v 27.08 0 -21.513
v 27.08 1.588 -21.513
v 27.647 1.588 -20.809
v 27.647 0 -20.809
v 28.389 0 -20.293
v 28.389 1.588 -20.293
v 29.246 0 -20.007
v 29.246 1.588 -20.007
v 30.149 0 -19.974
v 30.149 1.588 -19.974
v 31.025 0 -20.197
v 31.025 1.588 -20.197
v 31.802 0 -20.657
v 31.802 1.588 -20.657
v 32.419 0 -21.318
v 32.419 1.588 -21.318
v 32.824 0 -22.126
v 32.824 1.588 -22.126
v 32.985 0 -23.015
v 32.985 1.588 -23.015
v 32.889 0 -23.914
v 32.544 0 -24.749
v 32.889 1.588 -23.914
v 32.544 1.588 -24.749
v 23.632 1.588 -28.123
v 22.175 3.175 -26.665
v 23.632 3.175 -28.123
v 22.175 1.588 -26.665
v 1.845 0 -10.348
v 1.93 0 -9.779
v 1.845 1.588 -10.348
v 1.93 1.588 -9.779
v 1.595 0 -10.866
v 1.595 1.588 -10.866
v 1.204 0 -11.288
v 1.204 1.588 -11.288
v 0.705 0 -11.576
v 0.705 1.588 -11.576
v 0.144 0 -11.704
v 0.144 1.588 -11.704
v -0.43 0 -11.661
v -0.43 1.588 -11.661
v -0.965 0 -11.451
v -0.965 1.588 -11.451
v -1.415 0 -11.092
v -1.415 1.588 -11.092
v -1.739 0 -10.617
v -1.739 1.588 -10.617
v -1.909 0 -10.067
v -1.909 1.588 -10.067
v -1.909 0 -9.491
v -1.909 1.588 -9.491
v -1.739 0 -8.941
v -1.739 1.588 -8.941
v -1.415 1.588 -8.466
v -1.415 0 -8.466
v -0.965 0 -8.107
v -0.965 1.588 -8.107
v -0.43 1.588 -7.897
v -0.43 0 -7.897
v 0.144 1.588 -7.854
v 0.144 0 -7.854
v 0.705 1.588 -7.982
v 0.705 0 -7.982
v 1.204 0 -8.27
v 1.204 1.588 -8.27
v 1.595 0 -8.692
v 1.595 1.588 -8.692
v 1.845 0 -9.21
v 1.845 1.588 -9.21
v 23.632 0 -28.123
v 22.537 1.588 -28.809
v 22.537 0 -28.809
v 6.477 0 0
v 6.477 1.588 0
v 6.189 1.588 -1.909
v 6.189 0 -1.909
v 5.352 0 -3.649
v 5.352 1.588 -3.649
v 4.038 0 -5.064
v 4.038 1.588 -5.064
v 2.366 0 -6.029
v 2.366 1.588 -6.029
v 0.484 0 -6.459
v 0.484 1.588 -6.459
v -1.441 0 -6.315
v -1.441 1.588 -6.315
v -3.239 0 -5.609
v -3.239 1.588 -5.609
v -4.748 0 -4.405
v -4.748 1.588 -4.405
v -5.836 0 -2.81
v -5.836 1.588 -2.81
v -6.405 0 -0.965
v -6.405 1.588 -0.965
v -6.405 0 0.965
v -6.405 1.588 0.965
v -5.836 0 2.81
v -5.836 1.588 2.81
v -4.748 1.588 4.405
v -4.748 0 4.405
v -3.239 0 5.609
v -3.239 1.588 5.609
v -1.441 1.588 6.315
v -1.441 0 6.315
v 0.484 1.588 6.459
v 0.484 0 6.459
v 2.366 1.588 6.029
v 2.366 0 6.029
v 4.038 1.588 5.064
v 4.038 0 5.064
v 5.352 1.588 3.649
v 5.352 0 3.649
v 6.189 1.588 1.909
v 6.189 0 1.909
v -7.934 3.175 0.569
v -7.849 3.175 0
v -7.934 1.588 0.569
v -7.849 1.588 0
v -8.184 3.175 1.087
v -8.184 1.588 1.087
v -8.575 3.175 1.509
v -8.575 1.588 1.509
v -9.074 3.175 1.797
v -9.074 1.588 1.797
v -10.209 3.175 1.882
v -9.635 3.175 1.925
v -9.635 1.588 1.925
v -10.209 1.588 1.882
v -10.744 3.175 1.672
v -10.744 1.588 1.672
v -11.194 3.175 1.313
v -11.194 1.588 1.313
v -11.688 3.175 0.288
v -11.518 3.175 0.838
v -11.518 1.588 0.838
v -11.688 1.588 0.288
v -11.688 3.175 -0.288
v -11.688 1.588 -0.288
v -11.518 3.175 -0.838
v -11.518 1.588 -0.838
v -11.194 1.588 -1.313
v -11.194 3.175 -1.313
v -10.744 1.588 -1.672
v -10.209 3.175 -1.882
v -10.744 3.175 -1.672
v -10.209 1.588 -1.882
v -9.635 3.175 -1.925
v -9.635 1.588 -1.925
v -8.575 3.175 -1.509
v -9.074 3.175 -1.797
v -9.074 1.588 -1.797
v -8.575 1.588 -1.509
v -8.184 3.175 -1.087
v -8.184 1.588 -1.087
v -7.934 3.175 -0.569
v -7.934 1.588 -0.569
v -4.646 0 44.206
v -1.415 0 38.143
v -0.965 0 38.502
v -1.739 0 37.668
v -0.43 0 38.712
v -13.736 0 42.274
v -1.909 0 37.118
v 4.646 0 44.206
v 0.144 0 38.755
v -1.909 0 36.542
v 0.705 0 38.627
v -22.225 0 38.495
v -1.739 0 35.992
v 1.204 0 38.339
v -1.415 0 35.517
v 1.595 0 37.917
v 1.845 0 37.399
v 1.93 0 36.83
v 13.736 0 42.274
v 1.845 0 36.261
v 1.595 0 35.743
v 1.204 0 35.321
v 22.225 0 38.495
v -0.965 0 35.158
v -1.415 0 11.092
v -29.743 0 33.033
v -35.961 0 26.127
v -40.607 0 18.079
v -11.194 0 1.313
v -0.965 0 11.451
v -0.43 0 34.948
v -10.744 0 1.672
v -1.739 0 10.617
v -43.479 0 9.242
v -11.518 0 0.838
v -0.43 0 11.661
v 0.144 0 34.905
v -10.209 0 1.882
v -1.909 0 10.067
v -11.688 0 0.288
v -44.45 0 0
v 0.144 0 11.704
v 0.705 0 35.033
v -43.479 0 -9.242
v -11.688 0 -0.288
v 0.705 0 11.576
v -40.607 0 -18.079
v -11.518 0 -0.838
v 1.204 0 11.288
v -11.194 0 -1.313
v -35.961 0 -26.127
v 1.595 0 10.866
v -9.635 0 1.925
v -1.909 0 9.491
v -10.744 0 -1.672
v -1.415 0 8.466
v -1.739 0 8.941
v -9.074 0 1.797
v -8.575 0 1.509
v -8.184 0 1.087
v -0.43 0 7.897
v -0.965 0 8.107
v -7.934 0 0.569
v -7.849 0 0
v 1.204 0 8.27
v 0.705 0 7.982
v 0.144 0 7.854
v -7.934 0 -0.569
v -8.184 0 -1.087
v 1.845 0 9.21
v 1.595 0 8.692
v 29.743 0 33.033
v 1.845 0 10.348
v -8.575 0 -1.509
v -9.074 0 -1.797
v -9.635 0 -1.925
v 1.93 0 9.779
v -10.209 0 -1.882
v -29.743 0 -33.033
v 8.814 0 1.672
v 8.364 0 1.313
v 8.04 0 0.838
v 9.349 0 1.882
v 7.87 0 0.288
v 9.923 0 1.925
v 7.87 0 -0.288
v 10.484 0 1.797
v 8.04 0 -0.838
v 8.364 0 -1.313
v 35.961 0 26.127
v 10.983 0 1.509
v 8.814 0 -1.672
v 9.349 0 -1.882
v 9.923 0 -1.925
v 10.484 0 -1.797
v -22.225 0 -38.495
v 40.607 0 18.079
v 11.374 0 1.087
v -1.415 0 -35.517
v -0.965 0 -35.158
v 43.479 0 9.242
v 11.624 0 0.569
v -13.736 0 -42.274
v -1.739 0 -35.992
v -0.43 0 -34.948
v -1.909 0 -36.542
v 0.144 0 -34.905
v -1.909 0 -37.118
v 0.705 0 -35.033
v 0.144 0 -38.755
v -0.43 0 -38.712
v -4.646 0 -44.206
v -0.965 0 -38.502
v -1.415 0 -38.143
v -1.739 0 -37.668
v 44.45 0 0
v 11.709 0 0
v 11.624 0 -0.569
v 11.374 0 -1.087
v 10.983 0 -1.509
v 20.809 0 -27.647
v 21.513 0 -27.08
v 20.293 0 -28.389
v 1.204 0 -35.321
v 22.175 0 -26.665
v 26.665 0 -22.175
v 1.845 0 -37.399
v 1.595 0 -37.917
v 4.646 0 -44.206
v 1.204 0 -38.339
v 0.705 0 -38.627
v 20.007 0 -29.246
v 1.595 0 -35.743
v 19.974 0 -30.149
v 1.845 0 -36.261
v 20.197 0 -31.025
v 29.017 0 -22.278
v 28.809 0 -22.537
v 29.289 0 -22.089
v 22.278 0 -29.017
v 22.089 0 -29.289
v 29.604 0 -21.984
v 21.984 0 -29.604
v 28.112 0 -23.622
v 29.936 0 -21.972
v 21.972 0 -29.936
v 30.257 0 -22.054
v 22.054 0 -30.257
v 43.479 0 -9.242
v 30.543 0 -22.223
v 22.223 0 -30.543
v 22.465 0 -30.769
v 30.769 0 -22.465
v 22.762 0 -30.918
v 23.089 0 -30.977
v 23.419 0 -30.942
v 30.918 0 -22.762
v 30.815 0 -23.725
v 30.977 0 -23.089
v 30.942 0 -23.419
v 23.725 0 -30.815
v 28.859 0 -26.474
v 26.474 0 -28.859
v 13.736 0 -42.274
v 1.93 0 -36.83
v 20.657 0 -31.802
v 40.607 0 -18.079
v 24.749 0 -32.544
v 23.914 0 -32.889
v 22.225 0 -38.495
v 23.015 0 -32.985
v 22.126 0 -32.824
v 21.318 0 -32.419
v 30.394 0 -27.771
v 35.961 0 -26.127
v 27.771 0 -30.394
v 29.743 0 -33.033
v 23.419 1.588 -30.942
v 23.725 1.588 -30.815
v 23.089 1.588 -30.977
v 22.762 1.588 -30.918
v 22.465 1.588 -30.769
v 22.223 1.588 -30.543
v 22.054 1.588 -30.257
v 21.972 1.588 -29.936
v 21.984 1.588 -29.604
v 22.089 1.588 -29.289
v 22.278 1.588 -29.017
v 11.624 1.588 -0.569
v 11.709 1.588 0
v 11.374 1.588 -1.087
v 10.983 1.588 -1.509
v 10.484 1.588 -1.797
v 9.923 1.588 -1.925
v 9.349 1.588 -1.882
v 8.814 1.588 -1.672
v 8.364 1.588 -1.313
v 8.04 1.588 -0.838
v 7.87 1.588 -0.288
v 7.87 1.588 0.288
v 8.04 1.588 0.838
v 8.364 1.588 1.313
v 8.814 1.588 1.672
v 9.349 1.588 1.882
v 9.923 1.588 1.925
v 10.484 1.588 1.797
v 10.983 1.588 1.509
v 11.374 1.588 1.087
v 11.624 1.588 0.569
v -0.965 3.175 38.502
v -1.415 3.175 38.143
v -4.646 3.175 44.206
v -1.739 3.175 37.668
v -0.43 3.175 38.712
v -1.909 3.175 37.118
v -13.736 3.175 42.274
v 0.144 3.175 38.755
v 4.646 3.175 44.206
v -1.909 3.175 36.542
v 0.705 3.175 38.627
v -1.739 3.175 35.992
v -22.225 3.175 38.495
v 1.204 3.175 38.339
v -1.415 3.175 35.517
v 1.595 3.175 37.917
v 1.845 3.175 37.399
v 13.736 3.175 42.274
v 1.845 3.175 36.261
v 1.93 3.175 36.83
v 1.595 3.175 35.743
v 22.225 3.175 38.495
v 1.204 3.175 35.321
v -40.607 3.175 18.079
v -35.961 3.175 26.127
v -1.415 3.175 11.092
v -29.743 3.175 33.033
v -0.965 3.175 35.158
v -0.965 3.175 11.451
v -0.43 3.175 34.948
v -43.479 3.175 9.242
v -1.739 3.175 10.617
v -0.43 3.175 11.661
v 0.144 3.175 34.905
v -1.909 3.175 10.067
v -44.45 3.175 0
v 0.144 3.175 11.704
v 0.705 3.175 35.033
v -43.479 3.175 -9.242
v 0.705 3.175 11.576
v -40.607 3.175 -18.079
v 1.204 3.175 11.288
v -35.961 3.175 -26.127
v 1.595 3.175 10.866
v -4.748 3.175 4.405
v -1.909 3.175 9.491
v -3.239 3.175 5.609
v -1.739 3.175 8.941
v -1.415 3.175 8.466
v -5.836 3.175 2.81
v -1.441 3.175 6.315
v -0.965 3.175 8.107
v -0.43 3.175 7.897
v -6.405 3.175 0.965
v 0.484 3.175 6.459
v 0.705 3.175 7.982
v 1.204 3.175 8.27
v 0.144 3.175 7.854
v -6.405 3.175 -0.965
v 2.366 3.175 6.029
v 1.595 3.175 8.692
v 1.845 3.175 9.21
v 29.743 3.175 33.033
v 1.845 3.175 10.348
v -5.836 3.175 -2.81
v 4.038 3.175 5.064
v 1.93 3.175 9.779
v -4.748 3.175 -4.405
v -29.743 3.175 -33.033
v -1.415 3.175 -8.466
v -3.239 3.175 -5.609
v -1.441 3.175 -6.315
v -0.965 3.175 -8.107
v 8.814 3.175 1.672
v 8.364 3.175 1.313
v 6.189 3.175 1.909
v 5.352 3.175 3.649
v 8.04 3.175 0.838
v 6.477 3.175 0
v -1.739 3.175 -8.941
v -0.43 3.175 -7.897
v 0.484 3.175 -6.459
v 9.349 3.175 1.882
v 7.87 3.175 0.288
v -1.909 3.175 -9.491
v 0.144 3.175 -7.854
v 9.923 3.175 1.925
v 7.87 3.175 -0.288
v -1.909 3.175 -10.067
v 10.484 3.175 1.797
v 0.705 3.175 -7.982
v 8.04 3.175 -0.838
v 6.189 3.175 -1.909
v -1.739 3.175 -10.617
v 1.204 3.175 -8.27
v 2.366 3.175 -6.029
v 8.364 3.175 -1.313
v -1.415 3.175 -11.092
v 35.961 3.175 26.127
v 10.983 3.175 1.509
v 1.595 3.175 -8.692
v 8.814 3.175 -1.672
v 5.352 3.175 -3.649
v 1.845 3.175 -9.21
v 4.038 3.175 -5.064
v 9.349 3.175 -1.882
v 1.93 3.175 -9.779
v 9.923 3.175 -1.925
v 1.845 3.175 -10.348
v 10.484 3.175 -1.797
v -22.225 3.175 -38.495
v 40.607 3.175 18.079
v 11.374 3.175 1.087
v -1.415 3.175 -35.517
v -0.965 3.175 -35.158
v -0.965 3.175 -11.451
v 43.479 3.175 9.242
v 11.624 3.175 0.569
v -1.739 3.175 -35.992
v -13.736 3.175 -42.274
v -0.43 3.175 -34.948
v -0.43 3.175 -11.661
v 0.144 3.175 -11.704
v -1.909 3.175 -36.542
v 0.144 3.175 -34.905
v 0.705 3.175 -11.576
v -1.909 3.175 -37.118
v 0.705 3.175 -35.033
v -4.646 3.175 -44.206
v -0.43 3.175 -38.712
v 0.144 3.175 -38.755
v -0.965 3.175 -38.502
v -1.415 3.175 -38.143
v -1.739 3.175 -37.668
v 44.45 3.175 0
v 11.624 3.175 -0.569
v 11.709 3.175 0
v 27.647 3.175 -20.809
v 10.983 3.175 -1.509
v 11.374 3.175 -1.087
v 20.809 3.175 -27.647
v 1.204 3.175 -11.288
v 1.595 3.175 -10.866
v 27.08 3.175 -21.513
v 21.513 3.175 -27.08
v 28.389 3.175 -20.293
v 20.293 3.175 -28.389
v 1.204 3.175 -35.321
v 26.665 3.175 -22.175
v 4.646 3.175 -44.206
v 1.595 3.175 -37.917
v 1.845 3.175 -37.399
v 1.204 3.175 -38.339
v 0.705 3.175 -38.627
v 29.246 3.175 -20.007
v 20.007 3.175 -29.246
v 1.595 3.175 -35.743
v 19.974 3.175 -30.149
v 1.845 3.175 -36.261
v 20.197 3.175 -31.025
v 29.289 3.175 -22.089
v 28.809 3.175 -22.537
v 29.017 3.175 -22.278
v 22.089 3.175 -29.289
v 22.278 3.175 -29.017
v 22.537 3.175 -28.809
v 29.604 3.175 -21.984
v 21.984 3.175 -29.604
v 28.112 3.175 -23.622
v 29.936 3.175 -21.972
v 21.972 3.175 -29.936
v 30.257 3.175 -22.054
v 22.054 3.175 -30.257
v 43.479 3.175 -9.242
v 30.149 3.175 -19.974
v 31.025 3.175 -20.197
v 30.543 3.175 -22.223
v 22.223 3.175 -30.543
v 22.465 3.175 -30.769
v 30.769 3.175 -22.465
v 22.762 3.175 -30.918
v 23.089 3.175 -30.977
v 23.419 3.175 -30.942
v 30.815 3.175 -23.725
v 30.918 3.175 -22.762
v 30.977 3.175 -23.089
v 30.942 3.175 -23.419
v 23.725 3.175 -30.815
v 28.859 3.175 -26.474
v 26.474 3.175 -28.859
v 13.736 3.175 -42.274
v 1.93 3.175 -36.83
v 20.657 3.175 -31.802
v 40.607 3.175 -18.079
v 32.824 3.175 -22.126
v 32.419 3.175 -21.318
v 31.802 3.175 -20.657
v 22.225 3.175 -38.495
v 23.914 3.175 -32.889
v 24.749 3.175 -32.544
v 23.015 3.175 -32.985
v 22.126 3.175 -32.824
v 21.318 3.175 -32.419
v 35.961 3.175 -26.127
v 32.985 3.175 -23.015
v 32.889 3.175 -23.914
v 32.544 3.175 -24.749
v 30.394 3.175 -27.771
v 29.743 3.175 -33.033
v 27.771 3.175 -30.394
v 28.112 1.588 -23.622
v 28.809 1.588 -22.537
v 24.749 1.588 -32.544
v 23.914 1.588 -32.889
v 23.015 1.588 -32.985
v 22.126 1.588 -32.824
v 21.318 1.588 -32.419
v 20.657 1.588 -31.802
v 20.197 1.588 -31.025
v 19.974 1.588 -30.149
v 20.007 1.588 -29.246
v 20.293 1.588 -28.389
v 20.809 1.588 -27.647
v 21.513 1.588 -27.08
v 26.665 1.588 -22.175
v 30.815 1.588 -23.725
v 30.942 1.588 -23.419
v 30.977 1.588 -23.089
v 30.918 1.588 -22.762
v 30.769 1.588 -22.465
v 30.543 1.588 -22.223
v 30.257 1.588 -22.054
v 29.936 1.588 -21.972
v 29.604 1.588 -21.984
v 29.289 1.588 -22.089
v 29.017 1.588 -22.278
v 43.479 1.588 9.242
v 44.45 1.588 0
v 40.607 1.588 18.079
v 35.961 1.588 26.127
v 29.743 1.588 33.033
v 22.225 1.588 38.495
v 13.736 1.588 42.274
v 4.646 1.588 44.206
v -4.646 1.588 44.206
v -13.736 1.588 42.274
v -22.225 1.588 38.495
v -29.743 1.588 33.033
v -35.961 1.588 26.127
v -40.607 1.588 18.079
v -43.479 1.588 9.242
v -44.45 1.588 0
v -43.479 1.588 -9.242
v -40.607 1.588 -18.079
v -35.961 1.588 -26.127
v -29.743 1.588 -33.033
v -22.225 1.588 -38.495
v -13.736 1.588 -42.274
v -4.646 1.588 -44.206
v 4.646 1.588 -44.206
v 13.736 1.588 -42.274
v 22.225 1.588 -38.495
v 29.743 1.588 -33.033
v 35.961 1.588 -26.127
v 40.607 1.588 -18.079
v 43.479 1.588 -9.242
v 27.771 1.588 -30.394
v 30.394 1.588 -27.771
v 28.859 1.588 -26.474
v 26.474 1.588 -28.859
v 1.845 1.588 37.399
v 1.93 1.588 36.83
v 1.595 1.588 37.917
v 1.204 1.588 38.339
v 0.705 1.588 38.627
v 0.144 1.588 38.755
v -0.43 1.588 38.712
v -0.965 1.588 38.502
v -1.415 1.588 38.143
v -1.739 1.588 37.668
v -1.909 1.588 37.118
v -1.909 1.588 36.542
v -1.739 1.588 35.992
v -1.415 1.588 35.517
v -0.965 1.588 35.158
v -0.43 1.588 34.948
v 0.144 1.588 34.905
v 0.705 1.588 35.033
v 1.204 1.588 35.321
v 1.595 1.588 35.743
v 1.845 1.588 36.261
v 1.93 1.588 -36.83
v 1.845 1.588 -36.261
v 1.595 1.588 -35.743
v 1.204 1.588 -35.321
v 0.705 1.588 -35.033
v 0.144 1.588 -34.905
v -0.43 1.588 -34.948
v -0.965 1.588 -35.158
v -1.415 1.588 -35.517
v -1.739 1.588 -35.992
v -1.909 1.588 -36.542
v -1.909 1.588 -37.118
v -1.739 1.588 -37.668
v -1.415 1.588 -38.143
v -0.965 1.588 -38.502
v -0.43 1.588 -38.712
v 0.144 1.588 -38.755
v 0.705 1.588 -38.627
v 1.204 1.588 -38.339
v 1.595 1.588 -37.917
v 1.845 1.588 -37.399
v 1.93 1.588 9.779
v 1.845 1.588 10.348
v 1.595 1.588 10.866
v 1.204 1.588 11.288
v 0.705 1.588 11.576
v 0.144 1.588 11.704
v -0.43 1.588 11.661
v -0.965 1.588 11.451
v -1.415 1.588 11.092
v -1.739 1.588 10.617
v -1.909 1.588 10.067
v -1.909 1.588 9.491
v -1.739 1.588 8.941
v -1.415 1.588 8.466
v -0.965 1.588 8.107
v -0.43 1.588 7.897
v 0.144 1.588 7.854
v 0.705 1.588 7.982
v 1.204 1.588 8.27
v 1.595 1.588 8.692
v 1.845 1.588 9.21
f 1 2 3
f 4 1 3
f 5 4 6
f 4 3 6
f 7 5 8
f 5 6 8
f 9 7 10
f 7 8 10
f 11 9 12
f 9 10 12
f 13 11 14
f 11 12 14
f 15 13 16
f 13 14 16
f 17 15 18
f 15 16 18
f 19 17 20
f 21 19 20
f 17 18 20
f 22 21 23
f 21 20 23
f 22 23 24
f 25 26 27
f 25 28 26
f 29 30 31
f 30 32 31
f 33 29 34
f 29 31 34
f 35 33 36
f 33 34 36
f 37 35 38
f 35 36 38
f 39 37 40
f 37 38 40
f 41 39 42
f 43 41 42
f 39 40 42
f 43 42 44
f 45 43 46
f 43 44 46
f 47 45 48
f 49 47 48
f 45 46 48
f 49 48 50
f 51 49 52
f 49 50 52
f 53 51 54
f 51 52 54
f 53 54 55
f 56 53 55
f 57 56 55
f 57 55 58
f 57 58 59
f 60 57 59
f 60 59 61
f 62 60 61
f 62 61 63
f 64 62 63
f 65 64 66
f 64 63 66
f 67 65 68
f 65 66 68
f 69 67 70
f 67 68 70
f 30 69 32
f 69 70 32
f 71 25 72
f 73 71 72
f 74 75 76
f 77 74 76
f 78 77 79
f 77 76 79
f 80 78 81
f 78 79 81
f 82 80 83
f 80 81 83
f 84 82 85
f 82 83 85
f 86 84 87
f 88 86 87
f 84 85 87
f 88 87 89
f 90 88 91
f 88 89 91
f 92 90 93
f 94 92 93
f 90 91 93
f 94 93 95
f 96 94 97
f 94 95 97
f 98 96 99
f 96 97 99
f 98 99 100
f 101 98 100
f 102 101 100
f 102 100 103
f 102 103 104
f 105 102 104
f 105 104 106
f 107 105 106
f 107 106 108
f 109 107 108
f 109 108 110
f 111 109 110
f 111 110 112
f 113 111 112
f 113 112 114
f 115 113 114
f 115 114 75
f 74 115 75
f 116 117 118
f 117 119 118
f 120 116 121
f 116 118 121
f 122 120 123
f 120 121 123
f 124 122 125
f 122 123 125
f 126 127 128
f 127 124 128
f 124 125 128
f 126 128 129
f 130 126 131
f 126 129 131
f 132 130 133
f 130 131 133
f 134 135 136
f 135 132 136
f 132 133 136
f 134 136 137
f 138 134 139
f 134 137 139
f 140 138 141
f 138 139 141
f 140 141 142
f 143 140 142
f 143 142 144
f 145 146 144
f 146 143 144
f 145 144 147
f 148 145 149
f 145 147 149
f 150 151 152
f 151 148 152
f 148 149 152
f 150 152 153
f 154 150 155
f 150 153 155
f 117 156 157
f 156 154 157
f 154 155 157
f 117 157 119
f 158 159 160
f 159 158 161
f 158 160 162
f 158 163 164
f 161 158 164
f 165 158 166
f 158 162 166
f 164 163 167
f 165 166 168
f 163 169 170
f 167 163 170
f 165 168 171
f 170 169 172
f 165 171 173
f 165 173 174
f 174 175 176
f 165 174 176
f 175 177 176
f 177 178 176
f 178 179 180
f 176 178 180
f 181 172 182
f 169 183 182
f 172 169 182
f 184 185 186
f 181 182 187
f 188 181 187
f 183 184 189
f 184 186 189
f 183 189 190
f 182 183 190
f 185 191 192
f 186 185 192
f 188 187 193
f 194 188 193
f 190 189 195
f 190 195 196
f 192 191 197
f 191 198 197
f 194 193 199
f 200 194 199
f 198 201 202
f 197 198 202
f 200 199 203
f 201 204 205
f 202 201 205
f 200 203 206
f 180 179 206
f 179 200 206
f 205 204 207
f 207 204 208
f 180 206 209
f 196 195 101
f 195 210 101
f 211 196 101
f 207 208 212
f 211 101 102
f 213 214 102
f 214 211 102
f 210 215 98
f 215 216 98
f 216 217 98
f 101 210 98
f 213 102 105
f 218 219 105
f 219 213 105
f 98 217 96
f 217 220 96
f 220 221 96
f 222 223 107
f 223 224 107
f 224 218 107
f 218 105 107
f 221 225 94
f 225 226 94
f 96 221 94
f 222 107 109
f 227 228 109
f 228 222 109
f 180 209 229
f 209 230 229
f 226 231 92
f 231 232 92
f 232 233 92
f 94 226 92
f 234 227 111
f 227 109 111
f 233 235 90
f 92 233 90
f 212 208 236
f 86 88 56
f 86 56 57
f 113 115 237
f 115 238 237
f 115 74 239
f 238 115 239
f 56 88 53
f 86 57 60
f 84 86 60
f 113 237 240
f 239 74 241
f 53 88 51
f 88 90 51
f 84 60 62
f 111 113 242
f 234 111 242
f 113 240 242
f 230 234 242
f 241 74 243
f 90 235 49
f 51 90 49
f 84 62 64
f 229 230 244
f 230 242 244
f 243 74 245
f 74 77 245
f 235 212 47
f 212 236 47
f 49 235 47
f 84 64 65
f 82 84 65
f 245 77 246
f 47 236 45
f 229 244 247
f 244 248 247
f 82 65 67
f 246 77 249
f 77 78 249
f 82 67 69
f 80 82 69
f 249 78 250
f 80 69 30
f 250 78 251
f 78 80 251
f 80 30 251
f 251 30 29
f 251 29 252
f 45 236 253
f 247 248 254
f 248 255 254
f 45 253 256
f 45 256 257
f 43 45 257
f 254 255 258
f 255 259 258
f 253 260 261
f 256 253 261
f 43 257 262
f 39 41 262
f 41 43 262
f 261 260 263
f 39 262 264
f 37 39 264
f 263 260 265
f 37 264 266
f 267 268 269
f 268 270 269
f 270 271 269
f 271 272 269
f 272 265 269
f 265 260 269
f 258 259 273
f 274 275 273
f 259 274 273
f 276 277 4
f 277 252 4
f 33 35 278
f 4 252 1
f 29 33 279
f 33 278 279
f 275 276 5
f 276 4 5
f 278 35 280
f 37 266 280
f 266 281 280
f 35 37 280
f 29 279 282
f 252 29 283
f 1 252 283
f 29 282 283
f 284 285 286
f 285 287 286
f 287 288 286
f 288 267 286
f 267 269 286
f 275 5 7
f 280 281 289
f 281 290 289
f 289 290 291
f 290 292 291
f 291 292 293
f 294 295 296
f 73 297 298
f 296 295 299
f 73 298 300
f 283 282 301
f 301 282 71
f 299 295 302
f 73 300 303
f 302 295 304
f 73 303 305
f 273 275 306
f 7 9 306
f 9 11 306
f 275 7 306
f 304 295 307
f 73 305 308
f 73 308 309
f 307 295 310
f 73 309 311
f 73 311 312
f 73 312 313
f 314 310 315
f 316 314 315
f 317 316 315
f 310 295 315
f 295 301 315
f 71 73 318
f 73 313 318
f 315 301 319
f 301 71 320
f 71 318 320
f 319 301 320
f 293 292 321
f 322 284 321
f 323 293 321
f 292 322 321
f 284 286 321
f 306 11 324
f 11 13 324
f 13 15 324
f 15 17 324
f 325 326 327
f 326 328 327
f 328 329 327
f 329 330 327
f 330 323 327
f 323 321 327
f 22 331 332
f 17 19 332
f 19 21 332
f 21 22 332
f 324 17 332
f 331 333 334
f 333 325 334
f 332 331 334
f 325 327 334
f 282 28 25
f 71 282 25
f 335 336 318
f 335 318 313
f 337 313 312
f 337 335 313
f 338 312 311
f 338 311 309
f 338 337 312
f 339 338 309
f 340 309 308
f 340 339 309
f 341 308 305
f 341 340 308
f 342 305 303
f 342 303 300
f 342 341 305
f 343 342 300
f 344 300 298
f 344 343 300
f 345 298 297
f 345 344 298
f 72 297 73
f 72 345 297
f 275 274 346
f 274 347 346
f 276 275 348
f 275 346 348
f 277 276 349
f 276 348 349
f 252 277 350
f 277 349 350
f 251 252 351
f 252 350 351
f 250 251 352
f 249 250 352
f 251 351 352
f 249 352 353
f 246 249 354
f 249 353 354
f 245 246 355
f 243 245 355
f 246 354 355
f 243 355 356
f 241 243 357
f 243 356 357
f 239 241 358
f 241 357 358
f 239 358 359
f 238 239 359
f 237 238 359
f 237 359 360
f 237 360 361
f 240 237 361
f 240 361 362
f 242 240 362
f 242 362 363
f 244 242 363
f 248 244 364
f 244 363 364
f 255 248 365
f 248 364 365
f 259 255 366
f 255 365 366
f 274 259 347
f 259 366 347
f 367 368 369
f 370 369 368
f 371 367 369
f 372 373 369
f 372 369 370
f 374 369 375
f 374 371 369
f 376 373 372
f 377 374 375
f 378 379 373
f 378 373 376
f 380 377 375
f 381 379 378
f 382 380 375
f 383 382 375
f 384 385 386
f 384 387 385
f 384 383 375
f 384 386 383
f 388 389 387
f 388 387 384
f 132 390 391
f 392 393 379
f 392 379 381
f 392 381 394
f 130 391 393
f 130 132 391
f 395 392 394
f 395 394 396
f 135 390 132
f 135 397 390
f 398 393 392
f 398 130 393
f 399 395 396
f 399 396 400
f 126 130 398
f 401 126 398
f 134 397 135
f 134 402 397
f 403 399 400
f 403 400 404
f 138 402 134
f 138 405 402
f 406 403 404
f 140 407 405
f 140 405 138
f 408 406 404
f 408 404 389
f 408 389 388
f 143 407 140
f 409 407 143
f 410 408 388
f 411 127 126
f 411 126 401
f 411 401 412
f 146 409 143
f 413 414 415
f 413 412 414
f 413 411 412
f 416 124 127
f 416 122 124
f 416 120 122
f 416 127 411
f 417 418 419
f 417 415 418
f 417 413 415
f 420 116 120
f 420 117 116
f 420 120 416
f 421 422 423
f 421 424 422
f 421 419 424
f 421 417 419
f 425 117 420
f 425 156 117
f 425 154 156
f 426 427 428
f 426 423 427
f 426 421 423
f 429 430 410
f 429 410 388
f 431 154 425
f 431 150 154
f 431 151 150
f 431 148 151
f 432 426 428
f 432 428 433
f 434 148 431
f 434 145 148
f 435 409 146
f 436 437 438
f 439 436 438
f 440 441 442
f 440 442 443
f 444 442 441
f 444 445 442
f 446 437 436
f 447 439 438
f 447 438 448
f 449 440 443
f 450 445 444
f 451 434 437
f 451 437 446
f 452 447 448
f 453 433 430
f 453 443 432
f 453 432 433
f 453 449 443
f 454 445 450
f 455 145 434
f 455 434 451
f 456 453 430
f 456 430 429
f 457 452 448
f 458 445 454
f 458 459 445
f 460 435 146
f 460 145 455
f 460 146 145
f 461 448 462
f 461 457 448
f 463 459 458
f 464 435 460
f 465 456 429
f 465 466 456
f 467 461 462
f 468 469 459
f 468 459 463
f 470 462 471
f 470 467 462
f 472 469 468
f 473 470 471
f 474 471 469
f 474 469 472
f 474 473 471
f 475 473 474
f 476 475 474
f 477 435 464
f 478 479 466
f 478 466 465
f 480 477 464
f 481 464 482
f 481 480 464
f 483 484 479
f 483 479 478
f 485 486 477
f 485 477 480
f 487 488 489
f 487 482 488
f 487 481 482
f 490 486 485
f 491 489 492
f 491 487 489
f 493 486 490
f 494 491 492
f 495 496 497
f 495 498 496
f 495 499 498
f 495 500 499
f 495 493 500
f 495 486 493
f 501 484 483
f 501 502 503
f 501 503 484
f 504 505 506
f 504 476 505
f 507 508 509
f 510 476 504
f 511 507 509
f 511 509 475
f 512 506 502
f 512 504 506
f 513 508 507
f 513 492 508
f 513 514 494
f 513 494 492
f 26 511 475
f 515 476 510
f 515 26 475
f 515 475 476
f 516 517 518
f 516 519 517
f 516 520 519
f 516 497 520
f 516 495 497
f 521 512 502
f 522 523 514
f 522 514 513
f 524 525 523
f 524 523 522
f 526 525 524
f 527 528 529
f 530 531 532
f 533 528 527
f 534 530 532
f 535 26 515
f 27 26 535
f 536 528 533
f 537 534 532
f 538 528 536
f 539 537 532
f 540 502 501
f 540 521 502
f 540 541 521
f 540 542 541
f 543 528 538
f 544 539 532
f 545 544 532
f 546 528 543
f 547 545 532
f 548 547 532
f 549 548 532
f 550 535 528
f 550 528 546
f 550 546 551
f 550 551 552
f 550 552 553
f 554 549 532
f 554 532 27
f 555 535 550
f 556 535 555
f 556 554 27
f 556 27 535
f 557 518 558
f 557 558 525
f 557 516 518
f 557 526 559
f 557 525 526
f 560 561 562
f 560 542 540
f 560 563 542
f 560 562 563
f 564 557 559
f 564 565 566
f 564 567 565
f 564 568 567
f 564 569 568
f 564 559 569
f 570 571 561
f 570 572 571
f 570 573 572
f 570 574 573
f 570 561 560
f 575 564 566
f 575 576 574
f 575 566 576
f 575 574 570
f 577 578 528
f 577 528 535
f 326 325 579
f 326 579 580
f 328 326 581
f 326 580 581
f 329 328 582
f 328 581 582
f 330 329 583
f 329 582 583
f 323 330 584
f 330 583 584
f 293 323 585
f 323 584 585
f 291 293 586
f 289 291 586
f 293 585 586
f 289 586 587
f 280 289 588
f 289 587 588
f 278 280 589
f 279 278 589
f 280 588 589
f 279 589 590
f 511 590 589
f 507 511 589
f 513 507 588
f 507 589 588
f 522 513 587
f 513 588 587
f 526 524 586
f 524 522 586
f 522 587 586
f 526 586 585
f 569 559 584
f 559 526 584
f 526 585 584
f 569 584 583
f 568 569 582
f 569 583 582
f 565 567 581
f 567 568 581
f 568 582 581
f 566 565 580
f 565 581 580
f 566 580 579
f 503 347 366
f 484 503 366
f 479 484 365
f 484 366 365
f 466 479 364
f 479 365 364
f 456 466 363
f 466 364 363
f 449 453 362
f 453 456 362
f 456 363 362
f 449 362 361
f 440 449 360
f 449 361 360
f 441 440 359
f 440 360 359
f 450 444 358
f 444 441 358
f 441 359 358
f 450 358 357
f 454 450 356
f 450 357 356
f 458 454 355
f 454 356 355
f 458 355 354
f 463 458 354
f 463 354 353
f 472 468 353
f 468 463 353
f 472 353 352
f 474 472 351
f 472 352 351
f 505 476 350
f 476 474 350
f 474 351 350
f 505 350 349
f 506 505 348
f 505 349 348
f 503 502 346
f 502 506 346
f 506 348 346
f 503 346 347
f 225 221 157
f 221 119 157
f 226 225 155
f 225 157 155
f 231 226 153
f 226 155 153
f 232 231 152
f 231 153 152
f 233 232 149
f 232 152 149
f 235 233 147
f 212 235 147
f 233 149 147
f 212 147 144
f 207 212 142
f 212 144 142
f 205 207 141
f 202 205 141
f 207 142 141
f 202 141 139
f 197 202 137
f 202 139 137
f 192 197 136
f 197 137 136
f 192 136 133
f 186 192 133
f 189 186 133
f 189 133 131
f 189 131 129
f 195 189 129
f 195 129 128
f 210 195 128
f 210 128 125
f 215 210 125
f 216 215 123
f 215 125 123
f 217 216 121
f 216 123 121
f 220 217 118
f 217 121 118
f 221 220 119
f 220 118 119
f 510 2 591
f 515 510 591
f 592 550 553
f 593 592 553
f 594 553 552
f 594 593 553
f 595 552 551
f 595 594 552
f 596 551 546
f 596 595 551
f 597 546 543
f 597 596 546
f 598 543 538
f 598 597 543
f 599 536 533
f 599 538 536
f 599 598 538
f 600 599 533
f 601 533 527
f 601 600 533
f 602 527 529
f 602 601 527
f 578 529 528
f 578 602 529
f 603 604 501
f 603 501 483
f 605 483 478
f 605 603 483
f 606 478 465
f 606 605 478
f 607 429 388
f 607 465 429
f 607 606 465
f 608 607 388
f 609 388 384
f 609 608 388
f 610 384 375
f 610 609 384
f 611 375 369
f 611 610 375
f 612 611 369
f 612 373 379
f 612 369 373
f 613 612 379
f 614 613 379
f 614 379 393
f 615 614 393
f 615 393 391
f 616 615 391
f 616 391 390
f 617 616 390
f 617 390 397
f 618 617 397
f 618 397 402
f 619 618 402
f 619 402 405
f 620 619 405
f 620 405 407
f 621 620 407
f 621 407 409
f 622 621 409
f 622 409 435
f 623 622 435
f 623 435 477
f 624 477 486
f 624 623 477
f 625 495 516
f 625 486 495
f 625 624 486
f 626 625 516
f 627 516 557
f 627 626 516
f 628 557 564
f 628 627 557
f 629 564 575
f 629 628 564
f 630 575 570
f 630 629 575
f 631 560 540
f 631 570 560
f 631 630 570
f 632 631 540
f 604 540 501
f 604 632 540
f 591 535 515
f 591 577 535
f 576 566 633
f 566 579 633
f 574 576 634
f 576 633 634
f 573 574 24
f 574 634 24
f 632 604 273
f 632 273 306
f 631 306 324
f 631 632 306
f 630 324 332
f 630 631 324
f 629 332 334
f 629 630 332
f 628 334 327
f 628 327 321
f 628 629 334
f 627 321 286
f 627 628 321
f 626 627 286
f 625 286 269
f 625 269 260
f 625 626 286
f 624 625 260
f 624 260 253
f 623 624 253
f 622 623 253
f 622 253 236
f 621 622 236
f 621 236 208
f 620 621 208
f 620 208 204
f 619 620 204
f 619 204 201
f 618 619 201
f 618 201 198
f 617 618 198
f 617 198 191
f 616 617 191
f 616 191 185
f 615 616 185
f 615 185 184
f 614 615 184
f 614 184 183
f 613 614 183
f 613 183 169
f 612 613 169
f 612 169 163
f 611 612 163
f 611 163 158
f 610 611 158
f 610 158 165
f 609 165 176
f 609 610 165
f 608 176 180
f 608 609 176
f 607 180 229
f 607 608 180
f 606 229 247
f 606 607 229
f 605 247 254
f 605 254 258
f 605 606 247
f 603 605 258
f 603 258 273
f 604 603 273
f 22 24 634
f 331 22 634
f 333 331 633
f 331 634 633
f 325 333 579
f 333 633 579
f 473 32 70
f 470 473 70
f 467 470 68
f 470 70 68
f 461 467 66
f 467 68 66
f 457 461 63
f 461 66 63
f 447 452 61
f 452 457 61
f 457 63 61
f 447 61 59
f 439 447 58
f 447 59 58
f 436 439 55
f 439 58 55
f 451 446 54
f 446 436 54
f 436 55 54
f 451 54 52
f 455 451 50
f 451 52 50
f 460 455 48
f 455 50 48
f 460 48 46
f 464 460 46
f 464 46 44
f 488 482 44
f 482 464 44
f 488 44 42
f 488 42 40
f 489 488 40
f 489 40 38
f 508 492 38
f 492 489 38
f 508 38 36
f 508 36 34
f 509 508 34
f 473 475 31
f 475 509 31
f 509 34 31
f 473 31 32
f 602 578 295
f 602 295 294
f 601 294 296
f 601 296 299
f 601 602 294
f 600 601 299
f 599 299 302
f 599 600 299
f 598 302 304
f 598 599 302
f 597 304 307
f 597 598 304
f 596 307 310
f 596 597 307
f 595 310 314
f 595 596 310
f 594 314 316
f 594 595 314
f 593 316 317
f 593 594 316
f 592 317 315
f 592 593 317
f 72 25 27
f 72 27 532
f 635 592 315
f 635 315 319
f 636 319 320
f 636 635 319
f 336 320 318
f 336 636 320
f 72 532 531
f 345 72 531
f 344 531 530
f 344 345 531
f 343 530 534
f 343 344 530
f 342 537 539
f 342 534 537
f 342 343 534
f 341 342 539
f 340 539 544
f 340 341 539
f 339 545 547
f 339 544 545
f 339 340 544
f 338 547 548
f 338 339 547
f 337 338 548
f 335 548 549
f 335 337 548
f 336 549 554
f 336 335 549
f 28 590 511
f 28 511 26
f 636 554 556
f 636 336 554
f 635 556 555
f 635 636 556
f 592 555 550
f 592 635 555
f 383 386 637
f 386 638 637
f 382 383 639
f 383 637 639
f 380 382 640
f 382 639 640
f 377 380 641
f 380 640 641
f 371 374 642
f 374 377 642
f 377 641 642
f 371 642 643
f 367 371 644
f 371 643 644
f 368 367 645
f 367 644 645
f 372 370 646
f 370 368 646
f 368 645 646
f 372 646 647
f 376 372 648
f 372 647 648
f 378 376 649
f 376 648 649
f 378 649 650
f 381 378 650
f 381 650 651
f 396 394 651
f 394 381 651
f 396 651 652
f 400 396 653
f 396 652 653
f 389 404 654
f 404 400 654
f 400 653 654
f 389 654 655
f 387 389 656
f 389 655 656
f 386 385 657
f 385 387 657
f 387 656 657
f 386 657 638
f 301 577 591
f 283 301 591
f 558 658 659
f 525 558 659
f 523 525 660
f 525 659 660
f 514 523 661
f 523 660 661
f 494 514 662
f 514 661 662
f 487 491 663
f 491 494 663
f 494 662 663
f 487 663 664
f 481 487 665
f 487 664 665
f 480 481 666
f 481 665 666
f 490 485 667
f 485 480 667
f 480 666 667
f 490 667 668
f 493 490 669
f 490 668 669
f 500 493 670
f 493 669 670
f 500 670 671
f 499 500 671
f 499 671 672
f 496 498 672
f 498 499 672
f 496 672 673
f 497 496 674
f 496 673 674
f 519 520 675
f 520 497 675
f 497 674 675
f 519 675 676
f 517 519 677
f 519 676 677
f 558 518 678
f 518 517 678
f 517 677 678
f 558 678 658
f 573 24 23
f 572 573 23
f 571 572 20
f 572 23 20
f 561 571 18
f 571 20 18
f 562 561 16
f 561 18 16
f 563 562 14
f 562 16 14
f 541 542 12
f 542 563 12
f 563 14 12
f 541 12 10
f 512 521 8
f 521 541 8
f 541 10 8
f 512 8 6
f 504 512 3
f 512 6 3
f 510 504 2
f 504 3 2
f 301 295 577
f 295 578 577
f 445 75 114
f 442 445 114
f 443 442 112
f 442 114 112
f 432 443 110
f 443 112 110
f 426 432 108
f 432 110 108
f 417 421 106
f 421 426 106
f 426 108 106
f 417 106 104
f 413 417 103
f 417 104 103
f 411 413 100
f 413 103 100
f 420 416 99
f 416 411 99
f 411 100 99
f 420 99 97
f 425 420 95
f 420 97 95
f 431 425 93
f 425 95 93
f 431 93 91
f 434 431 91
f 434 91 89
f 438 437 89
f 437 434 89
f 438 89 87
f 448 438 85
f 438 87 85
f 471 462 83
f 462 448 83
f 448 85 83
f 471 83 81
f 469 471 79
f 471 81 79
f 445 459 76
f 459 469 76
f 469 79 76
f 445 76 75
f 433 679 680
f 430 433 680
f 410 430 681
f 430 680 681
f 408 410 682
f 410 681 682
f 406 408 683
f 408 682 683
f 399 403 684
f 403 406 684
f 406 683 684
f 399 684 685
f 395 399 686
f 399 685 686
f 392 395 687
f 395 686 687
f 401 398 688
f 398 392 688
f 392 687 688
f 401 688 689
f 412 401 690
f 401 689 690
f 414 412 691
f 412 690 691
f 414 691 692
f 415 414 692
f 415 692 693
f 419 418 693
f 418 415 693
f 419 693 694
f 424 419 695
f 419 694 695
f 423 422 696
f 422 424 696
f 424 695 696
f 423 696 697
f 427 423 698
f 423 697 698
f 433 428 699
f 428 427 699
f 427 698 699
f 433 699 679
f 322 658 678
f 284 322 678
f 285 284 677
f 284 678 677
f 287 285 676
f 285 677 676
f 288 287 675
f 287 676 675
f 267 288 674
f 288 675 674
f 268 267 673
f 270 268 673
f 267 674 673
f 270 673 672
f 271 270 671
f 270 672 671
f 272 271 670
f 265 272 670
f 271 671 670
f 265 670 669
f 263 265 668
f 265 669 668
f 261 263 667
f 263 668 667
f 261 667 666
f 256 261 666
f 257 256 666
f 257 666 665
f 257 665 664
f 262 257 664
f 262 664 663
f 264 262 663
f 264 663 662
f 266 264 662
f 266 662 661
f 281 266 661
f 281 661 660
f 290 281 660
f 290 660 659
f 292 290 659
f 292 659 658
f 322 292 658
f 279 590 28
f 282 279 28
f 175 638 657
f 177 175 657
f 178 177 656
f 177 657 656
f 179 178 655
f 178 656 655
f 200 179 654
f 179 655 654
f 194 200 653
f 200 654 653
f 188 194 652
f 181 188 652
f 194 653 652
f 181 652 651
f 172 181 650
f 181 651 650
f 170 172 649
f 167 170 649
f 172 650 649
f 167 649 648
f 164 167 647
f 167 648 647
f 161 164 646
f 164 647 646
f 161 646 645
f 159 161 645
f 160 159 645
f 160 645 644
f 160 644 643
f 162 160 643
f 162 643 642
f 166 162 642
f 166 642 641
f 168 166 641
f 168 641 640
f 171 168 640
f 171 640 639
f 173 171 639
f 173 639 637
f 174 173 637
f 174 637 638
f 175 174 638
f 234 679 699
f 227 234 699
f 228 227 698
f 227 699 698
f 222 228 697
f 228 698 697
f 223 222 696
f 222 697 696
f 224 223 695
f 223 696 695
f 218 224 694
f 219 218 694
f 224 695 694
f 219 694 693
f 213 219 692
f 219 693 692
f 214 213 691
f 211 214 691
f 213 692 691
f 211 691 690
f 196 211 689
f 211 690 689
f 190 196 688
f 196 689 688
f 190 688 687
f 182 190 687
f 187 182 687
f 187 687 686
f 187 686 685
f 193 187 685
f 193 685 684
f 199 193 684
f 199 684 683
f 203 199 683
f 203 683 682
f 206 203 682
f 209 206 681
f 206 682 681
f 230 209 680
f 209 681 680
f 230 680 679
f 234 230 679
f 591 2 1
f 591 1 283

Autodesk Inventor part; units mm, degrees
ref_plane "YZ Plane" through (0, 0, 0) normal (1, 0, 0) x (0, 1, 0)
ref_plane "XZ Plane" through (0, 0, 0) normal (0, 1, 0) x (-1, 0, 0)
ref_plane "XY Plane" through (0, 0, 0) normal (0, 0, 1) x (1, 0, 0)
ref_plane "Work Plane1" through (0, 1.5875, 0) normal (0, 1, 0) x (1, 0, 0)
sketch "Sketch1" plane through (0, 1.5875, 0) normal (0, 1, 0) x (1, 0, 0)
  circle A0 centre (0, 0) radius 44.45
  circle A1 centre (0, -9.779) radius 1.778 construction
  circle A2 centre (-9.779, 0) radius 1.778 construction
  circle A3 centre (0, 9.779) radius 1.778 construction
  circle A4 centre (9.779, 0) radius 1.778 construction
  circle A5 centre (0, 0) radius 6.35 construction
  circle A6 centre (0, -9.779) radius 1.9304
  circle A7 centre (-9.779, 0) radius 1.9304
  circle A8 centre (0, 9.779) radius 1.9304
  circle A9 centre (9.779, 0) radius 1.9304
  circle A10 centre (0, 0) radius 6.477
  circle A11 centre (0, 0) radius 34.925 construction
  circle A12 centre (0, -36.83) radius 1.9304
  circle A13 centre (0, 36.83) radius 1.9304
  line L0 (0, 0) -> (31.4309, 31.4309) construction
  line L1 (0, 0) -> (44.45, 0) construction
  line L2 (28.8087, 22.5367) -> (28.1119, 23.6217)
  line L3 (22.1752, 26.6653) -> (23.6324, 28.1226)
  line L4 (23.6324, 28.1226) -> (22.5367, 28.8087)
  line L5 (21.5127, 27.0801) -> (22.1752, 26.6653)
  line L6 (28.1119, 23.6217) -> (26.6653, 22.1752)
  arc A14 (28.8087, 22.5367) -> (30.8149, 23.7252) centre (29.8118, 23.131) ccw
  arc A15 (23.7252, 30.8149) -> (22.5367, 28.8087) centre (23.131, 29.8118) ccw
  arc A16 (24.7492, 32.5435) -> (21.5127, 27.0801) centre (23.131, 29.8118) ccw
  arc A17 (27.0801, 21.5127) -> (32.5435, 24.7492) centre (29.8118, 23.131) ccw
  arc A18 (30.8149, 23.7252) -> (23.7252, 30.8149) centre (13.4217, 13.4217) ccw
  arc A19 (32.5435, 24.7492) -> (24.7492, 32.5435) centre (13.4217, 13.4217) ccw
  line L7 (27.0801, 21.5127) -> (26.6653, 22.1752)
  point P0 (24.7492, 32.5435)
  dimension "d1" = 88.9
  dimension "d2" = 3.8608
  dimension "d3" = 3.8608
  dimension "d5" = 3.8608
  dimension "d6" = 12.954
  dimension "d7" = 69.85
  dimension "d8" = 3.8608
  dimension "d10" = 3.8608
  dimension "d11" = 36.83
  dimension "d12" = 45
  dimension "d13" = 36.83
extrude "Extrusion1" add sketch "Sketch1" along normal mid plane 3.175
properties part number "3_5 in spool outer plate"
